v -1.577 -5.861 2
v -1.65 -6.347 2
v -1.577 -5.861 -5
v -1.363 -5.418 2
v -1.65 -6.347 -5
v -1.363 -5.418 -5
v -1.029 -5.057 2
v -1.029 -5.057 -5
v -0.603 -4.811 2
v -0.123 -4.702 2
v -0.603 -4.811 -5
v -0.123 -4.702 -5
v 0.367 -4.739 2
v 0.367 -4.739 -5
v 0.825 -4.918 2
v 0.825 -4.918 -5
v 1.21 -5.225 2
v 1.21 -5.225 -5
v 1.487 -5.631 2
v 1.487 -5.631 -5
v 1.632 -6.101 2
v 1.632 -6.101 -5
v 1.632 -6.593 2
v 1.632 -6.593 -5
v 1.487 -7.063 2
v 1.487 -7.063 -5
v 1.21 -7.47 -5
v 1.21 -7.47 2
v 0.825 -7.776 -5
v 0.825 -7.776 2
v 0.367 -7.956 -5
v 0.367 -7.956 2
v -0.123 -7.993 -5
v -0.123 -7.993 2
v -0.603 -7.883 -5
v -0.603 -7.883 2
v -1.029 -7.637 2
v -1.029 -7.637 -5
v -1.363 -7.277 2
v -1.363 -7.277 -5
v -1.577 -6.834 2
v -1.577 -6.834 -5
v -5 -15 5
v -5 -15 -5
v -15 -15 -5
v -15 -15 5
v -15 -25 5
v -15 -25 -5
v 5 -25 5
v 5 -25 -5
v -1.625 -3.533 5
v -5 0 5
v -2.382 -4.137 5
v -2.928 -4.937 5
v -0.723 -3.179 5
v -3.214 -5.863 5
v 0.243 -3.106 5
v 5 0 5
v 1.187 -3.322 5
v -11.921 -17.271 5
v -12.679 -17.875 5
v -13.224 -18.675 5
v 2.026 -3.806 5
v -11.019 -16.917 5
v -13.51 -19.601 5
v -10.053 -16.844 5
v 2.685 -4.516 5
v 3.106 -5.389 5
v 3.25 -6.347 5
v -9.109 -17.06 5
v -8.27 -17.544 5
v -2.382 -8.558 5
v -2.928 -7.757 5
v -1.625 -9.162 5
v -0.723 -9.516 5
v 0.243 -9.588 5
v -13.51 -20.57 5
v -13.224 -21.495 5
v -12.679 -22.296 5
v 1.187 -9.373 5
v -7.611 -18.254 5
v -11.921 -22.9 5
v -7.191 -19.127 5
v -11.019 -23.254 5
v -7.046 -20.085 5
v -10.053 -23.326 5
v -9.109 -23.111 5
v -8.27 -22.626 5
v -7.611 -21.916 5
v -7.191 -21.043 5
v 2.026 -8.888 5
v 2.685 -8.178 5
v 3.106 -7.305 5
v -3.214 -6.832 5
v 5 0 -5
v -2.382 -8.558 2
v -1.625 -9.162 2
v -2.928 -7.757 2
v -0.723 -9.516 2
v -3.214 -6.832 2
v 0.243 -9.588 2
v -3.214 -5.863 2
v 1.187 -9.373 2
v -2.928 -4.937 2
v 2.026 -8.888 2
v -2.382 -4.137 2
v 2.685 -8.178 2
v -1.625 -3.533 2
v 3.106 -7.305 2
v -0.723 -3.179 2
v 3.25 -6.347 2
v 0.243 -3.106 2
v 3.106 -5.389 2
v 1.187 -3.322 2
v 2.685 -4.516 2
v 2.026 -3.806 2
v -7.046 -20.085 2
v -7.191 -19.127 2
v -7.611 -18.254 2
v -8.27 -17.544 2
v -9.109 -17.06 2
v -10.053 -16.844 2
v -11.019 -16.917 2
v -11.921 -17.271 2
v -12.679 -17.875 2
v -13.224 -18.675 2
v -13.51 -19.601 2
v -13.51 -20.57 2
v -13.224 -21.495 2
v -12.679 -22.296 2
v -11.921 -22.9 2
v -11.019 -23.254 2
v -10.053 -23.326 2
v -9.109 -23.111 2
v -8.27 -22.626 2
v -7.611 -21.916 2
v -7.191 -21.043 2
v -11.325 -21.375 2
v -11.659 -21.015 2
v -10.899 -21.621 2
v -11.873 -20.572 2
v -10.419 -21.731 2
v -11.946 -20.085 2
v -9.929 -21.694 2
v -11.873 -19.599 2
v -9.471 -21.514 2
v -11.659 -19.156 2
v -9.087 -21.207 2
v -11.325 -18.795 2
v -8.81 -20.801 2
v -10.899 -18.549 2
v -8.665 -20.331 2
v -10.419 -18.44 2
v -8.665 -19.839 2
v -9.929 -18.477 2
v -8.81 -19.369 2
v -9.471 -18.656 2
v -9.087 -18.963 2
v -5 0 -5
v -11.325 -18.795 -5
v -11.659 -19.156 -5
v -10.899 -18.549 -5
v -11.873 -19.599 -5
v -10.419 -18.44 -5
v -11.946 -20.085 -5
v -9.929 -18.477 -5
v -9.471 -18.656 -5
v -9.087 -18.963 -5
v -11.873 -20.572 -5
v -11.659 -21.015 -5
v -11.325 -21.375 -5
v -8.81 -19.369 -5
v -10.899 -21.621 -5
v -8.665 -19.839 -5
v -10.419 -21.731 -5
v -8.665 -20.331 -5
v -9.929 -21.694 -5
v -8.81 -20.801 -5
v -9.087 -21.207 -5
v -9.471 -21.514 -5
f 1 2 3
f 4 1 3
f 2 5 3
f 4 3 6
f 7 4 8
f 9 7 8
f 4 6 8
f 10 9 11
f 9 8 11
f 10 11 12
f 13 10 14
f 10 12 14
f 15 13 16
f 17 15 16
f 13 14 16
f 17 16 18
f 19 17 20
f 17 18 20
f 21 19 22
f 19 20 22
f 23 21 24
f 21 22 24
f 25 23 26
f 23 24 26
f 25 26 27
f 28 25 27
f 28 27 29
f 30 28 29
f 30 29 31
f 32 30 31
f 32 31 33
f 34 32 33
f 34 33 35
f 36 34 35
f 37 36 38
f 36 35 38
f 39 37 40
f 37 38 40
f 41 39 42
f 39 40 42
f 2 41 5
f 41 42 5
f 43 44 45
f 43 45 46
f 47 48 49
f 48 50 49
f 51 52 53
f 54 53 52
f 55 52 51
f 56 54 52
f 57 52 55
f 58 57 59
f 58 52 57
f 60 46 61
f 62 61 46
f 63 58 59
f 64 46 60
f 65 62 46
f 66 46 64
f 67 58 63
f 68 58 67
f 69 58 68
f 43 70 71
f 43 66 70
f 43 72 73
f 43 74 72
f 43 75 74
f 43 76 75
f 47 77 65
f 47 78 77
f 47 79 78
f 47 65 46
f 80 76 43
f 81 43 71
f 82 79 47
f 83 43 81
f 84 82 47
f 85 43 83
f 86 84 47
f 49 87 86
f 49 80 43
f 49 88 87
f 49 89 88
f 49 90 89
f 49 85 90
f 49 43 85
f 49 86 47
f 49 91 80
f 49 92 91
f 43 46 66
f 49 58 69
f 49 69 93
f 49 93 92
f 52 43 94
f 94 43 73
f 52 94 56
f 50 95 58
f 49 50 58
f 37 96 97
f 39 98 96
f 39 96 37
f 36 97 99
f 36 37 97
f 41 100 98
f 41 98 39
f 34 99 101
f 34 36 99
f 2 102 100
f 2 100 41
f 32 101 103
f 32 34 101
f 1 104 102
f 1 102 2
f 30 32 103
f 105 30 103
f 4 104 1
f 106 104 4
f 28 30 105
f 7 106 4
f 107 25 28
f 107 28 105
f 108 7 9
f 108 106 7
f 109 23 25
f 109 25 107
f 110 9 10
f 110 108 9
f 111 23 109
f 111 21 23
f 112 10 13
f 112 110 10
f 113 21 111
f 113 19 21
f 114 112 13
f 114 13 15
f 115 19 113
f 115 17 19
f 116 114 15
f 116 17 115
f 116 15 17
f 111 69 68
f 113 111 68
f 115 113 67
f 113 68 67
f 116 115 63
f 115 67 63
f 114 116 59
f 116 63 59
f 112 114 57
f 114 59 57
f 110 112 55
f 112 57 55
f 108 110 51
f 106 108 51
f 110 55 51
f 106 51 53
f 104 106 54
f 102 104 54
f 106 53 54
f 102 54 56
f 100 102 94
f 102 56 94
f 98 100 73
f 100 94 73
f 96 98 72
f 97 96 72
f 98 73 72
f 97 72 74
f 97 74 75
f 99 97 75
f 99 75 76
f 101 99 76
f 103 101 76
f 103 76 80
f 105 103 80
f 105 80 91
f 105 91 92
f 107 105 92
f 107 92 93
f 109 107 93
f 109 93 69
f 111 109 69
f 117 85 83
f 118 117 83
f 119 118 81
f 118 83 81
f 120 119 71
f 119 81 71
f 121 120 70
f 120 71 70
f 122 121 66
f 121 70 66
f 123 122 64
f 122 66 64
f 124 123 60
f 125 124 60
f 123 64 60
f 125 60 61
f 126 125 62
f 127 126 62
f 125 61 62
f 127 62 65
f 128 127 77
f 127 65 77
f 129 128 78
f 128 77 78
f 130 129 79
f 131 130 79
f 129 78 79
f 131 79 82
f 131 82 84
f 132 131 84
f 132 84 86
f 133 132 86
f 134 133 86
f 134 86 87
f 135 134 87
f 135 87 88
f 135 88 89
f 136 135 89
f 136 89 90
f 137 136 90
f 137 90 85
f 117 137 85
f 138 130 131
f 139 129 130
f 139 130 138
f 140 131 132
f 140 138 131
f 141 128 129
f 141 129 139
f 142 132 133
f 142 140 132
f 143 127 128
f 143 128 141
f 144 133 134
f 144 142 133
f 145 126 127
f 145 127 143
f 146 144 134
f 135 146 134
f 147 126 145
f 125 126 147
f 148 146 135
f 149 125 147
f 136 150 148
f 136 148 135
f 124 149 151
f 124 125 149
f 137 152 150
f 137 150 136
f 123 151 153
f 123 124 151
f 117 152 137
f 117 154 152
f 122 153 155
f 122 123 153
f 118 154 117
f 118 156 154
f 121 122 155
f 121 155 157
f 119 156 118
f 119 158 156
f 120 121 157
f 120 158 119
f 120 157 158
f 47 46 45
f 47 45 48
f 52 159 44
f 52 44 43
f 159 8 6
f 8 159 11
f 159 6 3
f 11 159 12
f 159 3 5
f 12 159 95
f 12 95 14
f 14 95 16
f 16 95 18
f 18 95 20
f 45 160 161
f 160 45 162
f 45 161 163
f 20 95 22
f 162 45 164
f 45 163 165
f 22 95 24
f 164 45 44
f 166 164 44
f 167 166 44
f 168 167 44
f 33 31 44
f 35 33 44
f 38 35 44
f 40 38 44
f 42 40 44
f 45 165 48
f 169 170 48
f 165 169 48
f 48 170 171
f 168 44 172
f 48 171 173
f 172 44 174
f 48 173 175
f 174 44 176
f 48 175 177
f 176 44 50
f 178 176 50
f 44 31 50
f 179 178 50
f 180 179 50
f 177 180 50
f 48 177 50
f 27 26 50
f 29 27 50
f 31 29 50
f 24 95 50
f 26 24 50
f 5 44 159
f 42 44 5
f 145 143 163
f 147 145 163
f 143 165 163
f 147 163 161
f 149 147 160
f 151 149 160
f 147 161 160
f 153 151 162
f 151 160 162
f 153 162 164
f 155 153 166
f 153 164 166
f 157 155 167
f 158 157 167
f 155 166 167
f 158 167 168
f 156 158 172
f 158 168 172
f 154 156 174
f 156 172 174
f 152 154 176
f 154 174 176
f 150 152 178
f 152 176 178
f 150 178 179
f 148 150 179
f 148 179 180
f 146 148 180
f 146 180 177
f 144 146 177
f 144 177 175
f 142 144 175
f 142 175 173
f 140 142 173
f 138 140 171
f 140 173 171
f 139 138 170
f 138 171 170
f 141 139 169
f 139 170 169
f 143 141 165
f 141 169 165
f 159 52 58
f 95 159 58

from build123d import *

# Parameters (mm, degrees)
F0_W           = 10
F0_H           = 10
F1_DEPTH       = 25
F2_W           = 10
F2_H           = 10
F3_DEPTH       = 10
F5_D           = 3.3
F5_CBORE_D     = 6.5
F5_CBORE_DEPTH = 3


with BuildPart() as f1:
    # F0 (on Front) → F1 (new body)
    with BuildSketch(Plane.XZ):
        Rectangle(F0_W, F0_H)
    extrude(amount=F1_DEPTH)

    # F2 (on face) → F3 (join)
    with BuildSketch(Plane(origin=(-5, 0, 0), x_dir=(0, -1, 0), z_dir=(-1, 0, 0))):
        with Locations((20, 0)):
            Rectangle(F2_W, F2_H)
    extrude(amount=F3_DEPTH)

    # F5 (through all)
    with Locations(Plane.XY.offset(5)):
        with Locations((0, -6.3472618349), (-10.296119377, -20.085208118)):
            CounterBoreHole(F5_D / 2, F5_CBORE_D / 2, F5_CBORE_DEPTH)


solid = f1.part
